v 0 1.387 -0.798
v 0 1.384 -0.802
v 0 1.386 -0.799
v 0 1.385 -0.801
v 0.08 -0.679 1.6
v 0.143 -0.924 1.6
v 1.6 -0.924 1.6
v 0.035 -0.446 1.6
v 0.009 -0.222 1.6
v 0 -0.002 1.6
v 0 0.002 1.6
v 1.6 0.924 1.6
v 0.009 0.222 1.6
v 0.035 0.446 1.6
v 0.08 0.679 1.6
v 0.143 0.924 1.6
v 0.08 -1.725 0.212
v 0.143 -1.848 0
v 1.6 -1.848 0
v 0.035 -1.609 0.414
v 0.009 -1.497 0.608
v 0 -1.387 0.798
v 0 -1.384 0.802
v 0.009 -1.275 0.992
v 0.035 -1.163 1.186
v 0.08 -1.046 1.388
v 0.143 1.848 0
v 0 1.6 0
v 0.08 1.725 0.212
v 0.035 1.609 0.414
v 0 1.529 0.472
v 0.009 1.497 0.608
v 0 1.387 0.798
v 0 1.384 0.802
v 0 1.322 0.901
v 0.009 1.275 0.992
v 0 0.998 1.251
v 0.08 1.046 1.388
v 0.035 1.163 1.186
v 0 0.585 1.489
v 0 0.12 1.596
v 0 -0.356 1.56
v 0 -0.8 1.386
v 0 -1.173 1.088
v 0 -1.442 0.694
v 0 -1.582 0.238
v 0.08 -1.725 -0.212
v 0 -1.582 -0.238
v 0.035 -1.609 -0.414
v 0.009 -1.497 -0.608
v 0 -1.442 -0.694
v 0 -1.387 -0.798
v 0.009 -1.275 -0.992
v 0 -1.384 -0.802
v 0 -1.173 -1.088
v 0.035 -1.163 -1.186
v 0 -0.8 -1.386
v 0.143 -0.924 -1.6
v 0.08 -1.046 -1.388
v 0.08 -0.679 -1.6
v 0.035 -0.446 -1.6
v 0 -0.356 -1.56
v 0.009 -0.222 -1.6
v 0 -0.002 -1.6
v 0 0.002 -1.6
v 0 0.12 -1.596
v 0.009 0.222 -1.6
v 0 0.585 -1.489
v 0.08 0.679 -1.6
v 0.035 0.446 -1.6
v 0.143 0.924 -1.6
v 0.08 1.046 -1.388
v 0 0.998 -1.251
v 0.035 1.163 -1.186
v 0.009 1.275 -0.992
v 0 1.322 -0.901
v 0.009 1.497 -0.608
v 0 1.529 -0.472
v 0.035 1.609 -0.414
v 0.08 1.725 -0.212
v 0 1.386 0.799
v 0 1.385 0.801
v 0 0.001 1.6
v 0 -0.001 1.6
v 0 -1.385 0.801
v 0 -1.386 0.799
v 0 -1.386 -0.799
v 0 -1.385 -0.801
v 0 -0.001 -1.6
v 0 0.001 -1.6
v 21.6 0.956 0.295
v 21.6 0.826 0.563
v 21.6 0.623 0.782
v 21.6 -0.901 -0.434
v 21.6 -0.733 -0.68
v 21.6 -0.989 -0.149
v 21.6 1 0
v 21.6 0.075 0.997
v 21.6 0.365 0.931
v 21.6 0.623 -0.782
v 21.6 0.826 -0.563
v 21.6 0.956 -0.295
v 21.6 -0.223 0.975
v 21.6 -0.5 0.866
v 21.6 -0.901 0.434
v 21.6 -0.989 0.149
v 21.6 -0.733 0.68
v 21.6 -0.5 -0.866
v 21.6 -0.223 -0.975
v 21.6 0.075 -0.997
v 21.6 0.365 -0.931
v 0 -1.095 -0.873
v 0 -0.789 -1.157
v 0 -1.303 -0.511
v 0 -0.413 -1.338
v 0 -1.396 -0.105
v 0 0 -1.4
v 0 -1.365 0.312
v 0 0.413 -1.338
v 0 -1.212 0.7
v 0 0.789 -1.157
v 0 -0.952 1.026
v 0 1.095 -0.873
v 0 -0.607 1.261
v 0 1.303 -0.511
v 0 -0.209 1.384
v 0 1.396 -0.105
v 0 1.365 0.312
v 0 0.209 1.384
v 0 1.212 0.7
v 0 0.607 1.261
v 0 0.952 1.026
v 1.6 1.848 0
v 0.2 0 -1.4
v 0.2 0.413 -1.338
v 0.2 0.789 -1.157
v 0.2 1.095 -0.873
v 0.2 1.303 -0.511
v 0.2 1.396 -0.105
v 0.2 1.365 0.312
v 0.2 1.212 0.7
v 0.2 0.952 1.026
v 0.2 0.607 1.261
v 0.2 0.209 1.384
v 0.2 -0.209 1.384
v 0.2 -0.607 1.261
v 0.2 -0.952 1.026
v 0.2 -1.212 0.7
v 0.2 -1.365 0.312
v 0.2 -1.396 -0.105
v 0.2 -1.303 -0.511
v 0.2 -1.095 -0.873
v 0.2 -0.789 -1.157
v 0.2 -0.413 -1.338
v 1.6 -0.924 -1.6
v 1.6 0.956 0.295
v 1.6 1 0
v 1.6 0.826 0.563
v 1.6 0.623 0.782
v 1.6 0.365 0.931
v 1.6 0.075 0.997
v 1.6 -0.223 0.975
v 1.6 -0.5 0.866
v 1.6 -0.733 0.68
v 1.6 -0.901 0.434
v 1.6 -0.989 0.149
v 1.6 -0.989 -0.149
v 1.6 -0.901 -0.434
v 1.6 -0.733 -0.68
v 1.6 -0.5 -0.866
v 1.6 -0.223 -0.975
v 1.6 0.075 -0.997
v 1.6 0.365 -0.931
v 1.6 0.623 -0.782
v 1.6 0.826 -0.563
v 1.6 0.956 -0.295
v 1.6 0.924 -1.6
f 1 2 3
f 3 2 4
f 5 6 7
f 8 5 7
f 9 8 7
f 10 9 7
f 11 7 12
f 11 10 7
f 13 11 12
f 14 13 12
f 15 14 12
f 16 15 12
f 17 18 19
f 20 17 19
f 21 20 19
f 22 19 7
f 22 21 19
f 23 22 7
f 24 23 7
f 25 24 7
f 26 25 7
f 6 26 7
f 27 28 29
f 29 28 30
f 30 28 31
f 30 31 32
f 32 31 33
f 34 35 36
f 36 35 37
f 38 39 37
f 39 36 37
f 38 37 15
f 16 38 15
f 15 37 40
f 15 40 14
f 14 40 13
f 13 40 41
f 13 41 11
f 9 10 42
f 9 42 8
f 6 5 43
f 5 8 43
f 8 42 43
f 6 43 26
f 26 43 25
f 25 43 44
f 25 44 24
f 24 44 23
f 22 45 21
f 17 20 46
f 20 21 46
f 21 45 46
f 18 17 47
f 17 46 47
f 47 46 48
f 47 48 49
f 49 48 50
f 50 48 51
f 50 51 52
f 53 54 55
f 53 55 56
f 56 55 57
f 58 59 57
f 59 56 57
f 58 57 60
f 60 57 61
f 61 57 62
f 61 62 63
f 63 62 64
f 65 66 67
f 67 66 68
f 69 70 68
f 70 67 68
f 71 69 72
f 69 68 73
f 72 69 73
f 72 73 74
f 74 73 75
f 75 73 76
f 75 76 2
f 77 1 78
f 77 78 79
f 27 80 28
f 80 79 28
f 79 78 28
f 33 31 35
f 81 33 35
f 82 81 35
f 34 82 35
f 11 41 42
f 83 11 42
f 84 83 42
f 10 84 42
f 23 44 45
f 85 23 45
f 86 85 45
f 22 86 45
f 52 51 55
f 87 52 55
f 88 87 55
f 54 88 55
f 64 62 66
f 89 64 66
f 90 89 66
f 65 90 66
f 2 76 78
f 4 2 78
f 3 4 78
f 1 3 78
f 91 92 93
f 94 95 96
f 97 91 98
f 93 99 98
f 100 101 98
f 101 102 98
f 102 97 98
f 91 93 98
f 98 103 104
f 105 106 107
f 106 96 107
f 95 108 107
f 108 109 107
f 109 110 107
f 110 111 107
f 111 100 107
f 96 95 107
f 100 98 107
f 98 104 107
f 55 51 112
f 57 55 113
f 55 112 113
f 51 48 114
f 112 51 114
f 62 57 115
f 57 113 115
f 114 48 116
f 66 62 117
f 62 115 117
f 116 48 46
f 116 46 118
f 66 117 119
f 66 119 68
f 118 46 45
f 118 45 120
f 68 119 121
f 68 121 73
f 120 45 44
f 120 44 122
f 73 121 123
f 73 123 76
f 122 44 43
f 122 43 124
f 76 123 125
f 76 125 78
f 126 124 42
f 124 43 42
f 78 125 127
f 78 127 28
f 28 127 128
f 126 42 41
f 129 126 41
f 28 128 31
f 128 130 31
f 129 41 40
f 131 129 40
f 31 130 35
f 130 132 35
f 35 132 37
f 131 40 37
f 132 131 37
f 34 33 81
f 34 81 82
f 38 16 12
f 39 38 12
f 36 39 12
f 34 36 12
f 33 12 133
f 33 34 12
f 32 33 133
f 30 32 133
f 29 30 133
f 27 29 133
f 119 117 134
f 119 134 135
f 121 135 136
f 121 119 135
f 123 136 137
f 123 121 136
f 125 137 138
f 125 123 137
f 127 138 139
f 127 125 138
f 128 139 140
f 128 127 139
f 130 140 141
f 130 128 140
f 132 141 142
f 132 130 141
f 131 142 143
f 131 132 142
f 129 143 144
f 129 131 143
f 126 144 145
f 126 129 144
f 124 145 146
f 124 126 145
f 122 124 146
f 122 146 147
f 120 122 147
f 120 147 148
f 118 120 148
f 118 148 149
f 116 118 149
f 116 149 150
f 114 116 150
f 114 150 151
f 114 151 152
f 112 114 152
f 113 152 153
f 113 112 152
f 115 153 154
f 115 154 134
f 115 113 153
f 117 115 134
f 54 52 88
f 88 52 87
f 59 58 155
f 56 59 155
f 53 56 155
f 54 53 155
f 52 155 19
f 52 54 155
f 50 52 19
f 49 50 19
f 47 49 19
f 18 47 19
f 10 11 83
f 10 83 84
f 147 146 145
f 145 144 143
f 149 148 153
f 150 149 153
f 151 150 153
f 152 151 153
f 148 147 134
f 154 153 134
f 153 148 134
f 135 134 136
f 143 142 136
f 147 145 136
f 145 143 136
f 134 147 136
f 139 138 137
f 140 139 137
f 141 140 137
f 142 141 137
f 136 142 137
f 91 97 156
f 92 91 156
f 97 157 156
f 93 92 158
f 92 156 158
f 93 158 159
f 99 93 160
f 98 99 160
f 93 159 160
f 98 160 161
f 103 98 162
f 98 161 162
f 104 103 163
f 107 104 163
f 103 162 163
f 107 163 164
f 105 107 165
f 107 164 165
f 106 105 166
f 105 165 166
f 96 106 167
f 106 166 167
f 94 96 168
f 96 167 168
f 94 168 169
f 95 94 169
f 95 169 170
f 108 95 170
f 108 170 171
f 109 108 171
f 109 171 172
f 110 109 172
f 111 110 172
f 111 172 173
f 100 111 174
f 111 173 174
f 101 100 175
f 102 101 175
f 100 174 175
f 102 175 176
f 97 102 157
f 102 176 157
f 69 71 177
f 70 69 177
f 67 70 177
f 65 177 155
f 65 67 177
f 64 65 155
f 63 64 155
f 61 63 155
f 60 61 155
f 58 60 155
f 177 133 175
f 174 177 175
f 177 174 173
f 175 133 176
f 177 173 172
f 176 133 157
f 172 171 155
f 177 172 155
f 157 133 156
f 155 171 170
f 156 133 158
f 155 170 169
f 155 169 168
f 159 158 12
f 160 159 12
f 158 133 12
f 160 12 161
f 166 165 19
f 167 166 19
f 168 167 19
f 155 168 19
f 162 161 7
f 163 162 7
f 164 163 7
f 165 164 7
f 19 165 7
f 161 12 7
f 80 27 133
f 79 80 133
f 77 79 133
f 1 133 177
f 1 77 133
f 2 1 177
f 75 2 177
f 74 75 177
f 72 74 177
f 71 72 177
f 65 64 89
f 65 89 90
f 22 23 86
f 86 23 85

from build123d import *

# Parameters (mm, degrees)
HEX_DIE_START = 1e-06
SKETCH2_R     = 1.866050808
HEX_DIE_DEPTH = 1.599999
SKETCH4_R     = 1.4
INDENT_DEPTH  = 0.2


with BuildPart() as part:
    # BodySke → Base-Revolve (revolve)
    with BuildSketch(Plane.XY):
        Polygon((1.6, 1), (1.6, 1.847575058), (0.142937526, 1.847575058), (0, 1.6), (0, 0), (21.6, 0), (21.6, 1), align=None)
    revolve(axis=Axis((-25.4, 0, 0), (1, 0, 0)))

    # Sketch2 → Hex-Die (cut)
    with BuildSketch(Plane(origin=(0, 0, 0), x_dir=(0, 0, -1), z_dir=(1, 0, 0)).offset(HEX_DIE_START)):
        Circle(SKETCH2_R)
        Polygon((-1.6, 0.923760435), (0, 1.847520869), (1.6, 0.923760435), (1.6, -0.923760435), (0, -1.847520869), (-1.6, -0.923760435), align=None, mode=Mode.SUBTRACT)
    extrude(amount=HEX_DIE_DEPTH, mode=Mode.SUBTRACT)

    # Sketch4 → Indent (cut)
    with BuildSketch(Plane(origin=(0, 0, 0), x_dir=(0, 0, -1), z_dir=(1, 0, 0))):
        Circle(SKETCH4_R)
    extrude(amount=INDENT_DEPTH, mode=Mode.SUBTRACT)


solid = part.part
